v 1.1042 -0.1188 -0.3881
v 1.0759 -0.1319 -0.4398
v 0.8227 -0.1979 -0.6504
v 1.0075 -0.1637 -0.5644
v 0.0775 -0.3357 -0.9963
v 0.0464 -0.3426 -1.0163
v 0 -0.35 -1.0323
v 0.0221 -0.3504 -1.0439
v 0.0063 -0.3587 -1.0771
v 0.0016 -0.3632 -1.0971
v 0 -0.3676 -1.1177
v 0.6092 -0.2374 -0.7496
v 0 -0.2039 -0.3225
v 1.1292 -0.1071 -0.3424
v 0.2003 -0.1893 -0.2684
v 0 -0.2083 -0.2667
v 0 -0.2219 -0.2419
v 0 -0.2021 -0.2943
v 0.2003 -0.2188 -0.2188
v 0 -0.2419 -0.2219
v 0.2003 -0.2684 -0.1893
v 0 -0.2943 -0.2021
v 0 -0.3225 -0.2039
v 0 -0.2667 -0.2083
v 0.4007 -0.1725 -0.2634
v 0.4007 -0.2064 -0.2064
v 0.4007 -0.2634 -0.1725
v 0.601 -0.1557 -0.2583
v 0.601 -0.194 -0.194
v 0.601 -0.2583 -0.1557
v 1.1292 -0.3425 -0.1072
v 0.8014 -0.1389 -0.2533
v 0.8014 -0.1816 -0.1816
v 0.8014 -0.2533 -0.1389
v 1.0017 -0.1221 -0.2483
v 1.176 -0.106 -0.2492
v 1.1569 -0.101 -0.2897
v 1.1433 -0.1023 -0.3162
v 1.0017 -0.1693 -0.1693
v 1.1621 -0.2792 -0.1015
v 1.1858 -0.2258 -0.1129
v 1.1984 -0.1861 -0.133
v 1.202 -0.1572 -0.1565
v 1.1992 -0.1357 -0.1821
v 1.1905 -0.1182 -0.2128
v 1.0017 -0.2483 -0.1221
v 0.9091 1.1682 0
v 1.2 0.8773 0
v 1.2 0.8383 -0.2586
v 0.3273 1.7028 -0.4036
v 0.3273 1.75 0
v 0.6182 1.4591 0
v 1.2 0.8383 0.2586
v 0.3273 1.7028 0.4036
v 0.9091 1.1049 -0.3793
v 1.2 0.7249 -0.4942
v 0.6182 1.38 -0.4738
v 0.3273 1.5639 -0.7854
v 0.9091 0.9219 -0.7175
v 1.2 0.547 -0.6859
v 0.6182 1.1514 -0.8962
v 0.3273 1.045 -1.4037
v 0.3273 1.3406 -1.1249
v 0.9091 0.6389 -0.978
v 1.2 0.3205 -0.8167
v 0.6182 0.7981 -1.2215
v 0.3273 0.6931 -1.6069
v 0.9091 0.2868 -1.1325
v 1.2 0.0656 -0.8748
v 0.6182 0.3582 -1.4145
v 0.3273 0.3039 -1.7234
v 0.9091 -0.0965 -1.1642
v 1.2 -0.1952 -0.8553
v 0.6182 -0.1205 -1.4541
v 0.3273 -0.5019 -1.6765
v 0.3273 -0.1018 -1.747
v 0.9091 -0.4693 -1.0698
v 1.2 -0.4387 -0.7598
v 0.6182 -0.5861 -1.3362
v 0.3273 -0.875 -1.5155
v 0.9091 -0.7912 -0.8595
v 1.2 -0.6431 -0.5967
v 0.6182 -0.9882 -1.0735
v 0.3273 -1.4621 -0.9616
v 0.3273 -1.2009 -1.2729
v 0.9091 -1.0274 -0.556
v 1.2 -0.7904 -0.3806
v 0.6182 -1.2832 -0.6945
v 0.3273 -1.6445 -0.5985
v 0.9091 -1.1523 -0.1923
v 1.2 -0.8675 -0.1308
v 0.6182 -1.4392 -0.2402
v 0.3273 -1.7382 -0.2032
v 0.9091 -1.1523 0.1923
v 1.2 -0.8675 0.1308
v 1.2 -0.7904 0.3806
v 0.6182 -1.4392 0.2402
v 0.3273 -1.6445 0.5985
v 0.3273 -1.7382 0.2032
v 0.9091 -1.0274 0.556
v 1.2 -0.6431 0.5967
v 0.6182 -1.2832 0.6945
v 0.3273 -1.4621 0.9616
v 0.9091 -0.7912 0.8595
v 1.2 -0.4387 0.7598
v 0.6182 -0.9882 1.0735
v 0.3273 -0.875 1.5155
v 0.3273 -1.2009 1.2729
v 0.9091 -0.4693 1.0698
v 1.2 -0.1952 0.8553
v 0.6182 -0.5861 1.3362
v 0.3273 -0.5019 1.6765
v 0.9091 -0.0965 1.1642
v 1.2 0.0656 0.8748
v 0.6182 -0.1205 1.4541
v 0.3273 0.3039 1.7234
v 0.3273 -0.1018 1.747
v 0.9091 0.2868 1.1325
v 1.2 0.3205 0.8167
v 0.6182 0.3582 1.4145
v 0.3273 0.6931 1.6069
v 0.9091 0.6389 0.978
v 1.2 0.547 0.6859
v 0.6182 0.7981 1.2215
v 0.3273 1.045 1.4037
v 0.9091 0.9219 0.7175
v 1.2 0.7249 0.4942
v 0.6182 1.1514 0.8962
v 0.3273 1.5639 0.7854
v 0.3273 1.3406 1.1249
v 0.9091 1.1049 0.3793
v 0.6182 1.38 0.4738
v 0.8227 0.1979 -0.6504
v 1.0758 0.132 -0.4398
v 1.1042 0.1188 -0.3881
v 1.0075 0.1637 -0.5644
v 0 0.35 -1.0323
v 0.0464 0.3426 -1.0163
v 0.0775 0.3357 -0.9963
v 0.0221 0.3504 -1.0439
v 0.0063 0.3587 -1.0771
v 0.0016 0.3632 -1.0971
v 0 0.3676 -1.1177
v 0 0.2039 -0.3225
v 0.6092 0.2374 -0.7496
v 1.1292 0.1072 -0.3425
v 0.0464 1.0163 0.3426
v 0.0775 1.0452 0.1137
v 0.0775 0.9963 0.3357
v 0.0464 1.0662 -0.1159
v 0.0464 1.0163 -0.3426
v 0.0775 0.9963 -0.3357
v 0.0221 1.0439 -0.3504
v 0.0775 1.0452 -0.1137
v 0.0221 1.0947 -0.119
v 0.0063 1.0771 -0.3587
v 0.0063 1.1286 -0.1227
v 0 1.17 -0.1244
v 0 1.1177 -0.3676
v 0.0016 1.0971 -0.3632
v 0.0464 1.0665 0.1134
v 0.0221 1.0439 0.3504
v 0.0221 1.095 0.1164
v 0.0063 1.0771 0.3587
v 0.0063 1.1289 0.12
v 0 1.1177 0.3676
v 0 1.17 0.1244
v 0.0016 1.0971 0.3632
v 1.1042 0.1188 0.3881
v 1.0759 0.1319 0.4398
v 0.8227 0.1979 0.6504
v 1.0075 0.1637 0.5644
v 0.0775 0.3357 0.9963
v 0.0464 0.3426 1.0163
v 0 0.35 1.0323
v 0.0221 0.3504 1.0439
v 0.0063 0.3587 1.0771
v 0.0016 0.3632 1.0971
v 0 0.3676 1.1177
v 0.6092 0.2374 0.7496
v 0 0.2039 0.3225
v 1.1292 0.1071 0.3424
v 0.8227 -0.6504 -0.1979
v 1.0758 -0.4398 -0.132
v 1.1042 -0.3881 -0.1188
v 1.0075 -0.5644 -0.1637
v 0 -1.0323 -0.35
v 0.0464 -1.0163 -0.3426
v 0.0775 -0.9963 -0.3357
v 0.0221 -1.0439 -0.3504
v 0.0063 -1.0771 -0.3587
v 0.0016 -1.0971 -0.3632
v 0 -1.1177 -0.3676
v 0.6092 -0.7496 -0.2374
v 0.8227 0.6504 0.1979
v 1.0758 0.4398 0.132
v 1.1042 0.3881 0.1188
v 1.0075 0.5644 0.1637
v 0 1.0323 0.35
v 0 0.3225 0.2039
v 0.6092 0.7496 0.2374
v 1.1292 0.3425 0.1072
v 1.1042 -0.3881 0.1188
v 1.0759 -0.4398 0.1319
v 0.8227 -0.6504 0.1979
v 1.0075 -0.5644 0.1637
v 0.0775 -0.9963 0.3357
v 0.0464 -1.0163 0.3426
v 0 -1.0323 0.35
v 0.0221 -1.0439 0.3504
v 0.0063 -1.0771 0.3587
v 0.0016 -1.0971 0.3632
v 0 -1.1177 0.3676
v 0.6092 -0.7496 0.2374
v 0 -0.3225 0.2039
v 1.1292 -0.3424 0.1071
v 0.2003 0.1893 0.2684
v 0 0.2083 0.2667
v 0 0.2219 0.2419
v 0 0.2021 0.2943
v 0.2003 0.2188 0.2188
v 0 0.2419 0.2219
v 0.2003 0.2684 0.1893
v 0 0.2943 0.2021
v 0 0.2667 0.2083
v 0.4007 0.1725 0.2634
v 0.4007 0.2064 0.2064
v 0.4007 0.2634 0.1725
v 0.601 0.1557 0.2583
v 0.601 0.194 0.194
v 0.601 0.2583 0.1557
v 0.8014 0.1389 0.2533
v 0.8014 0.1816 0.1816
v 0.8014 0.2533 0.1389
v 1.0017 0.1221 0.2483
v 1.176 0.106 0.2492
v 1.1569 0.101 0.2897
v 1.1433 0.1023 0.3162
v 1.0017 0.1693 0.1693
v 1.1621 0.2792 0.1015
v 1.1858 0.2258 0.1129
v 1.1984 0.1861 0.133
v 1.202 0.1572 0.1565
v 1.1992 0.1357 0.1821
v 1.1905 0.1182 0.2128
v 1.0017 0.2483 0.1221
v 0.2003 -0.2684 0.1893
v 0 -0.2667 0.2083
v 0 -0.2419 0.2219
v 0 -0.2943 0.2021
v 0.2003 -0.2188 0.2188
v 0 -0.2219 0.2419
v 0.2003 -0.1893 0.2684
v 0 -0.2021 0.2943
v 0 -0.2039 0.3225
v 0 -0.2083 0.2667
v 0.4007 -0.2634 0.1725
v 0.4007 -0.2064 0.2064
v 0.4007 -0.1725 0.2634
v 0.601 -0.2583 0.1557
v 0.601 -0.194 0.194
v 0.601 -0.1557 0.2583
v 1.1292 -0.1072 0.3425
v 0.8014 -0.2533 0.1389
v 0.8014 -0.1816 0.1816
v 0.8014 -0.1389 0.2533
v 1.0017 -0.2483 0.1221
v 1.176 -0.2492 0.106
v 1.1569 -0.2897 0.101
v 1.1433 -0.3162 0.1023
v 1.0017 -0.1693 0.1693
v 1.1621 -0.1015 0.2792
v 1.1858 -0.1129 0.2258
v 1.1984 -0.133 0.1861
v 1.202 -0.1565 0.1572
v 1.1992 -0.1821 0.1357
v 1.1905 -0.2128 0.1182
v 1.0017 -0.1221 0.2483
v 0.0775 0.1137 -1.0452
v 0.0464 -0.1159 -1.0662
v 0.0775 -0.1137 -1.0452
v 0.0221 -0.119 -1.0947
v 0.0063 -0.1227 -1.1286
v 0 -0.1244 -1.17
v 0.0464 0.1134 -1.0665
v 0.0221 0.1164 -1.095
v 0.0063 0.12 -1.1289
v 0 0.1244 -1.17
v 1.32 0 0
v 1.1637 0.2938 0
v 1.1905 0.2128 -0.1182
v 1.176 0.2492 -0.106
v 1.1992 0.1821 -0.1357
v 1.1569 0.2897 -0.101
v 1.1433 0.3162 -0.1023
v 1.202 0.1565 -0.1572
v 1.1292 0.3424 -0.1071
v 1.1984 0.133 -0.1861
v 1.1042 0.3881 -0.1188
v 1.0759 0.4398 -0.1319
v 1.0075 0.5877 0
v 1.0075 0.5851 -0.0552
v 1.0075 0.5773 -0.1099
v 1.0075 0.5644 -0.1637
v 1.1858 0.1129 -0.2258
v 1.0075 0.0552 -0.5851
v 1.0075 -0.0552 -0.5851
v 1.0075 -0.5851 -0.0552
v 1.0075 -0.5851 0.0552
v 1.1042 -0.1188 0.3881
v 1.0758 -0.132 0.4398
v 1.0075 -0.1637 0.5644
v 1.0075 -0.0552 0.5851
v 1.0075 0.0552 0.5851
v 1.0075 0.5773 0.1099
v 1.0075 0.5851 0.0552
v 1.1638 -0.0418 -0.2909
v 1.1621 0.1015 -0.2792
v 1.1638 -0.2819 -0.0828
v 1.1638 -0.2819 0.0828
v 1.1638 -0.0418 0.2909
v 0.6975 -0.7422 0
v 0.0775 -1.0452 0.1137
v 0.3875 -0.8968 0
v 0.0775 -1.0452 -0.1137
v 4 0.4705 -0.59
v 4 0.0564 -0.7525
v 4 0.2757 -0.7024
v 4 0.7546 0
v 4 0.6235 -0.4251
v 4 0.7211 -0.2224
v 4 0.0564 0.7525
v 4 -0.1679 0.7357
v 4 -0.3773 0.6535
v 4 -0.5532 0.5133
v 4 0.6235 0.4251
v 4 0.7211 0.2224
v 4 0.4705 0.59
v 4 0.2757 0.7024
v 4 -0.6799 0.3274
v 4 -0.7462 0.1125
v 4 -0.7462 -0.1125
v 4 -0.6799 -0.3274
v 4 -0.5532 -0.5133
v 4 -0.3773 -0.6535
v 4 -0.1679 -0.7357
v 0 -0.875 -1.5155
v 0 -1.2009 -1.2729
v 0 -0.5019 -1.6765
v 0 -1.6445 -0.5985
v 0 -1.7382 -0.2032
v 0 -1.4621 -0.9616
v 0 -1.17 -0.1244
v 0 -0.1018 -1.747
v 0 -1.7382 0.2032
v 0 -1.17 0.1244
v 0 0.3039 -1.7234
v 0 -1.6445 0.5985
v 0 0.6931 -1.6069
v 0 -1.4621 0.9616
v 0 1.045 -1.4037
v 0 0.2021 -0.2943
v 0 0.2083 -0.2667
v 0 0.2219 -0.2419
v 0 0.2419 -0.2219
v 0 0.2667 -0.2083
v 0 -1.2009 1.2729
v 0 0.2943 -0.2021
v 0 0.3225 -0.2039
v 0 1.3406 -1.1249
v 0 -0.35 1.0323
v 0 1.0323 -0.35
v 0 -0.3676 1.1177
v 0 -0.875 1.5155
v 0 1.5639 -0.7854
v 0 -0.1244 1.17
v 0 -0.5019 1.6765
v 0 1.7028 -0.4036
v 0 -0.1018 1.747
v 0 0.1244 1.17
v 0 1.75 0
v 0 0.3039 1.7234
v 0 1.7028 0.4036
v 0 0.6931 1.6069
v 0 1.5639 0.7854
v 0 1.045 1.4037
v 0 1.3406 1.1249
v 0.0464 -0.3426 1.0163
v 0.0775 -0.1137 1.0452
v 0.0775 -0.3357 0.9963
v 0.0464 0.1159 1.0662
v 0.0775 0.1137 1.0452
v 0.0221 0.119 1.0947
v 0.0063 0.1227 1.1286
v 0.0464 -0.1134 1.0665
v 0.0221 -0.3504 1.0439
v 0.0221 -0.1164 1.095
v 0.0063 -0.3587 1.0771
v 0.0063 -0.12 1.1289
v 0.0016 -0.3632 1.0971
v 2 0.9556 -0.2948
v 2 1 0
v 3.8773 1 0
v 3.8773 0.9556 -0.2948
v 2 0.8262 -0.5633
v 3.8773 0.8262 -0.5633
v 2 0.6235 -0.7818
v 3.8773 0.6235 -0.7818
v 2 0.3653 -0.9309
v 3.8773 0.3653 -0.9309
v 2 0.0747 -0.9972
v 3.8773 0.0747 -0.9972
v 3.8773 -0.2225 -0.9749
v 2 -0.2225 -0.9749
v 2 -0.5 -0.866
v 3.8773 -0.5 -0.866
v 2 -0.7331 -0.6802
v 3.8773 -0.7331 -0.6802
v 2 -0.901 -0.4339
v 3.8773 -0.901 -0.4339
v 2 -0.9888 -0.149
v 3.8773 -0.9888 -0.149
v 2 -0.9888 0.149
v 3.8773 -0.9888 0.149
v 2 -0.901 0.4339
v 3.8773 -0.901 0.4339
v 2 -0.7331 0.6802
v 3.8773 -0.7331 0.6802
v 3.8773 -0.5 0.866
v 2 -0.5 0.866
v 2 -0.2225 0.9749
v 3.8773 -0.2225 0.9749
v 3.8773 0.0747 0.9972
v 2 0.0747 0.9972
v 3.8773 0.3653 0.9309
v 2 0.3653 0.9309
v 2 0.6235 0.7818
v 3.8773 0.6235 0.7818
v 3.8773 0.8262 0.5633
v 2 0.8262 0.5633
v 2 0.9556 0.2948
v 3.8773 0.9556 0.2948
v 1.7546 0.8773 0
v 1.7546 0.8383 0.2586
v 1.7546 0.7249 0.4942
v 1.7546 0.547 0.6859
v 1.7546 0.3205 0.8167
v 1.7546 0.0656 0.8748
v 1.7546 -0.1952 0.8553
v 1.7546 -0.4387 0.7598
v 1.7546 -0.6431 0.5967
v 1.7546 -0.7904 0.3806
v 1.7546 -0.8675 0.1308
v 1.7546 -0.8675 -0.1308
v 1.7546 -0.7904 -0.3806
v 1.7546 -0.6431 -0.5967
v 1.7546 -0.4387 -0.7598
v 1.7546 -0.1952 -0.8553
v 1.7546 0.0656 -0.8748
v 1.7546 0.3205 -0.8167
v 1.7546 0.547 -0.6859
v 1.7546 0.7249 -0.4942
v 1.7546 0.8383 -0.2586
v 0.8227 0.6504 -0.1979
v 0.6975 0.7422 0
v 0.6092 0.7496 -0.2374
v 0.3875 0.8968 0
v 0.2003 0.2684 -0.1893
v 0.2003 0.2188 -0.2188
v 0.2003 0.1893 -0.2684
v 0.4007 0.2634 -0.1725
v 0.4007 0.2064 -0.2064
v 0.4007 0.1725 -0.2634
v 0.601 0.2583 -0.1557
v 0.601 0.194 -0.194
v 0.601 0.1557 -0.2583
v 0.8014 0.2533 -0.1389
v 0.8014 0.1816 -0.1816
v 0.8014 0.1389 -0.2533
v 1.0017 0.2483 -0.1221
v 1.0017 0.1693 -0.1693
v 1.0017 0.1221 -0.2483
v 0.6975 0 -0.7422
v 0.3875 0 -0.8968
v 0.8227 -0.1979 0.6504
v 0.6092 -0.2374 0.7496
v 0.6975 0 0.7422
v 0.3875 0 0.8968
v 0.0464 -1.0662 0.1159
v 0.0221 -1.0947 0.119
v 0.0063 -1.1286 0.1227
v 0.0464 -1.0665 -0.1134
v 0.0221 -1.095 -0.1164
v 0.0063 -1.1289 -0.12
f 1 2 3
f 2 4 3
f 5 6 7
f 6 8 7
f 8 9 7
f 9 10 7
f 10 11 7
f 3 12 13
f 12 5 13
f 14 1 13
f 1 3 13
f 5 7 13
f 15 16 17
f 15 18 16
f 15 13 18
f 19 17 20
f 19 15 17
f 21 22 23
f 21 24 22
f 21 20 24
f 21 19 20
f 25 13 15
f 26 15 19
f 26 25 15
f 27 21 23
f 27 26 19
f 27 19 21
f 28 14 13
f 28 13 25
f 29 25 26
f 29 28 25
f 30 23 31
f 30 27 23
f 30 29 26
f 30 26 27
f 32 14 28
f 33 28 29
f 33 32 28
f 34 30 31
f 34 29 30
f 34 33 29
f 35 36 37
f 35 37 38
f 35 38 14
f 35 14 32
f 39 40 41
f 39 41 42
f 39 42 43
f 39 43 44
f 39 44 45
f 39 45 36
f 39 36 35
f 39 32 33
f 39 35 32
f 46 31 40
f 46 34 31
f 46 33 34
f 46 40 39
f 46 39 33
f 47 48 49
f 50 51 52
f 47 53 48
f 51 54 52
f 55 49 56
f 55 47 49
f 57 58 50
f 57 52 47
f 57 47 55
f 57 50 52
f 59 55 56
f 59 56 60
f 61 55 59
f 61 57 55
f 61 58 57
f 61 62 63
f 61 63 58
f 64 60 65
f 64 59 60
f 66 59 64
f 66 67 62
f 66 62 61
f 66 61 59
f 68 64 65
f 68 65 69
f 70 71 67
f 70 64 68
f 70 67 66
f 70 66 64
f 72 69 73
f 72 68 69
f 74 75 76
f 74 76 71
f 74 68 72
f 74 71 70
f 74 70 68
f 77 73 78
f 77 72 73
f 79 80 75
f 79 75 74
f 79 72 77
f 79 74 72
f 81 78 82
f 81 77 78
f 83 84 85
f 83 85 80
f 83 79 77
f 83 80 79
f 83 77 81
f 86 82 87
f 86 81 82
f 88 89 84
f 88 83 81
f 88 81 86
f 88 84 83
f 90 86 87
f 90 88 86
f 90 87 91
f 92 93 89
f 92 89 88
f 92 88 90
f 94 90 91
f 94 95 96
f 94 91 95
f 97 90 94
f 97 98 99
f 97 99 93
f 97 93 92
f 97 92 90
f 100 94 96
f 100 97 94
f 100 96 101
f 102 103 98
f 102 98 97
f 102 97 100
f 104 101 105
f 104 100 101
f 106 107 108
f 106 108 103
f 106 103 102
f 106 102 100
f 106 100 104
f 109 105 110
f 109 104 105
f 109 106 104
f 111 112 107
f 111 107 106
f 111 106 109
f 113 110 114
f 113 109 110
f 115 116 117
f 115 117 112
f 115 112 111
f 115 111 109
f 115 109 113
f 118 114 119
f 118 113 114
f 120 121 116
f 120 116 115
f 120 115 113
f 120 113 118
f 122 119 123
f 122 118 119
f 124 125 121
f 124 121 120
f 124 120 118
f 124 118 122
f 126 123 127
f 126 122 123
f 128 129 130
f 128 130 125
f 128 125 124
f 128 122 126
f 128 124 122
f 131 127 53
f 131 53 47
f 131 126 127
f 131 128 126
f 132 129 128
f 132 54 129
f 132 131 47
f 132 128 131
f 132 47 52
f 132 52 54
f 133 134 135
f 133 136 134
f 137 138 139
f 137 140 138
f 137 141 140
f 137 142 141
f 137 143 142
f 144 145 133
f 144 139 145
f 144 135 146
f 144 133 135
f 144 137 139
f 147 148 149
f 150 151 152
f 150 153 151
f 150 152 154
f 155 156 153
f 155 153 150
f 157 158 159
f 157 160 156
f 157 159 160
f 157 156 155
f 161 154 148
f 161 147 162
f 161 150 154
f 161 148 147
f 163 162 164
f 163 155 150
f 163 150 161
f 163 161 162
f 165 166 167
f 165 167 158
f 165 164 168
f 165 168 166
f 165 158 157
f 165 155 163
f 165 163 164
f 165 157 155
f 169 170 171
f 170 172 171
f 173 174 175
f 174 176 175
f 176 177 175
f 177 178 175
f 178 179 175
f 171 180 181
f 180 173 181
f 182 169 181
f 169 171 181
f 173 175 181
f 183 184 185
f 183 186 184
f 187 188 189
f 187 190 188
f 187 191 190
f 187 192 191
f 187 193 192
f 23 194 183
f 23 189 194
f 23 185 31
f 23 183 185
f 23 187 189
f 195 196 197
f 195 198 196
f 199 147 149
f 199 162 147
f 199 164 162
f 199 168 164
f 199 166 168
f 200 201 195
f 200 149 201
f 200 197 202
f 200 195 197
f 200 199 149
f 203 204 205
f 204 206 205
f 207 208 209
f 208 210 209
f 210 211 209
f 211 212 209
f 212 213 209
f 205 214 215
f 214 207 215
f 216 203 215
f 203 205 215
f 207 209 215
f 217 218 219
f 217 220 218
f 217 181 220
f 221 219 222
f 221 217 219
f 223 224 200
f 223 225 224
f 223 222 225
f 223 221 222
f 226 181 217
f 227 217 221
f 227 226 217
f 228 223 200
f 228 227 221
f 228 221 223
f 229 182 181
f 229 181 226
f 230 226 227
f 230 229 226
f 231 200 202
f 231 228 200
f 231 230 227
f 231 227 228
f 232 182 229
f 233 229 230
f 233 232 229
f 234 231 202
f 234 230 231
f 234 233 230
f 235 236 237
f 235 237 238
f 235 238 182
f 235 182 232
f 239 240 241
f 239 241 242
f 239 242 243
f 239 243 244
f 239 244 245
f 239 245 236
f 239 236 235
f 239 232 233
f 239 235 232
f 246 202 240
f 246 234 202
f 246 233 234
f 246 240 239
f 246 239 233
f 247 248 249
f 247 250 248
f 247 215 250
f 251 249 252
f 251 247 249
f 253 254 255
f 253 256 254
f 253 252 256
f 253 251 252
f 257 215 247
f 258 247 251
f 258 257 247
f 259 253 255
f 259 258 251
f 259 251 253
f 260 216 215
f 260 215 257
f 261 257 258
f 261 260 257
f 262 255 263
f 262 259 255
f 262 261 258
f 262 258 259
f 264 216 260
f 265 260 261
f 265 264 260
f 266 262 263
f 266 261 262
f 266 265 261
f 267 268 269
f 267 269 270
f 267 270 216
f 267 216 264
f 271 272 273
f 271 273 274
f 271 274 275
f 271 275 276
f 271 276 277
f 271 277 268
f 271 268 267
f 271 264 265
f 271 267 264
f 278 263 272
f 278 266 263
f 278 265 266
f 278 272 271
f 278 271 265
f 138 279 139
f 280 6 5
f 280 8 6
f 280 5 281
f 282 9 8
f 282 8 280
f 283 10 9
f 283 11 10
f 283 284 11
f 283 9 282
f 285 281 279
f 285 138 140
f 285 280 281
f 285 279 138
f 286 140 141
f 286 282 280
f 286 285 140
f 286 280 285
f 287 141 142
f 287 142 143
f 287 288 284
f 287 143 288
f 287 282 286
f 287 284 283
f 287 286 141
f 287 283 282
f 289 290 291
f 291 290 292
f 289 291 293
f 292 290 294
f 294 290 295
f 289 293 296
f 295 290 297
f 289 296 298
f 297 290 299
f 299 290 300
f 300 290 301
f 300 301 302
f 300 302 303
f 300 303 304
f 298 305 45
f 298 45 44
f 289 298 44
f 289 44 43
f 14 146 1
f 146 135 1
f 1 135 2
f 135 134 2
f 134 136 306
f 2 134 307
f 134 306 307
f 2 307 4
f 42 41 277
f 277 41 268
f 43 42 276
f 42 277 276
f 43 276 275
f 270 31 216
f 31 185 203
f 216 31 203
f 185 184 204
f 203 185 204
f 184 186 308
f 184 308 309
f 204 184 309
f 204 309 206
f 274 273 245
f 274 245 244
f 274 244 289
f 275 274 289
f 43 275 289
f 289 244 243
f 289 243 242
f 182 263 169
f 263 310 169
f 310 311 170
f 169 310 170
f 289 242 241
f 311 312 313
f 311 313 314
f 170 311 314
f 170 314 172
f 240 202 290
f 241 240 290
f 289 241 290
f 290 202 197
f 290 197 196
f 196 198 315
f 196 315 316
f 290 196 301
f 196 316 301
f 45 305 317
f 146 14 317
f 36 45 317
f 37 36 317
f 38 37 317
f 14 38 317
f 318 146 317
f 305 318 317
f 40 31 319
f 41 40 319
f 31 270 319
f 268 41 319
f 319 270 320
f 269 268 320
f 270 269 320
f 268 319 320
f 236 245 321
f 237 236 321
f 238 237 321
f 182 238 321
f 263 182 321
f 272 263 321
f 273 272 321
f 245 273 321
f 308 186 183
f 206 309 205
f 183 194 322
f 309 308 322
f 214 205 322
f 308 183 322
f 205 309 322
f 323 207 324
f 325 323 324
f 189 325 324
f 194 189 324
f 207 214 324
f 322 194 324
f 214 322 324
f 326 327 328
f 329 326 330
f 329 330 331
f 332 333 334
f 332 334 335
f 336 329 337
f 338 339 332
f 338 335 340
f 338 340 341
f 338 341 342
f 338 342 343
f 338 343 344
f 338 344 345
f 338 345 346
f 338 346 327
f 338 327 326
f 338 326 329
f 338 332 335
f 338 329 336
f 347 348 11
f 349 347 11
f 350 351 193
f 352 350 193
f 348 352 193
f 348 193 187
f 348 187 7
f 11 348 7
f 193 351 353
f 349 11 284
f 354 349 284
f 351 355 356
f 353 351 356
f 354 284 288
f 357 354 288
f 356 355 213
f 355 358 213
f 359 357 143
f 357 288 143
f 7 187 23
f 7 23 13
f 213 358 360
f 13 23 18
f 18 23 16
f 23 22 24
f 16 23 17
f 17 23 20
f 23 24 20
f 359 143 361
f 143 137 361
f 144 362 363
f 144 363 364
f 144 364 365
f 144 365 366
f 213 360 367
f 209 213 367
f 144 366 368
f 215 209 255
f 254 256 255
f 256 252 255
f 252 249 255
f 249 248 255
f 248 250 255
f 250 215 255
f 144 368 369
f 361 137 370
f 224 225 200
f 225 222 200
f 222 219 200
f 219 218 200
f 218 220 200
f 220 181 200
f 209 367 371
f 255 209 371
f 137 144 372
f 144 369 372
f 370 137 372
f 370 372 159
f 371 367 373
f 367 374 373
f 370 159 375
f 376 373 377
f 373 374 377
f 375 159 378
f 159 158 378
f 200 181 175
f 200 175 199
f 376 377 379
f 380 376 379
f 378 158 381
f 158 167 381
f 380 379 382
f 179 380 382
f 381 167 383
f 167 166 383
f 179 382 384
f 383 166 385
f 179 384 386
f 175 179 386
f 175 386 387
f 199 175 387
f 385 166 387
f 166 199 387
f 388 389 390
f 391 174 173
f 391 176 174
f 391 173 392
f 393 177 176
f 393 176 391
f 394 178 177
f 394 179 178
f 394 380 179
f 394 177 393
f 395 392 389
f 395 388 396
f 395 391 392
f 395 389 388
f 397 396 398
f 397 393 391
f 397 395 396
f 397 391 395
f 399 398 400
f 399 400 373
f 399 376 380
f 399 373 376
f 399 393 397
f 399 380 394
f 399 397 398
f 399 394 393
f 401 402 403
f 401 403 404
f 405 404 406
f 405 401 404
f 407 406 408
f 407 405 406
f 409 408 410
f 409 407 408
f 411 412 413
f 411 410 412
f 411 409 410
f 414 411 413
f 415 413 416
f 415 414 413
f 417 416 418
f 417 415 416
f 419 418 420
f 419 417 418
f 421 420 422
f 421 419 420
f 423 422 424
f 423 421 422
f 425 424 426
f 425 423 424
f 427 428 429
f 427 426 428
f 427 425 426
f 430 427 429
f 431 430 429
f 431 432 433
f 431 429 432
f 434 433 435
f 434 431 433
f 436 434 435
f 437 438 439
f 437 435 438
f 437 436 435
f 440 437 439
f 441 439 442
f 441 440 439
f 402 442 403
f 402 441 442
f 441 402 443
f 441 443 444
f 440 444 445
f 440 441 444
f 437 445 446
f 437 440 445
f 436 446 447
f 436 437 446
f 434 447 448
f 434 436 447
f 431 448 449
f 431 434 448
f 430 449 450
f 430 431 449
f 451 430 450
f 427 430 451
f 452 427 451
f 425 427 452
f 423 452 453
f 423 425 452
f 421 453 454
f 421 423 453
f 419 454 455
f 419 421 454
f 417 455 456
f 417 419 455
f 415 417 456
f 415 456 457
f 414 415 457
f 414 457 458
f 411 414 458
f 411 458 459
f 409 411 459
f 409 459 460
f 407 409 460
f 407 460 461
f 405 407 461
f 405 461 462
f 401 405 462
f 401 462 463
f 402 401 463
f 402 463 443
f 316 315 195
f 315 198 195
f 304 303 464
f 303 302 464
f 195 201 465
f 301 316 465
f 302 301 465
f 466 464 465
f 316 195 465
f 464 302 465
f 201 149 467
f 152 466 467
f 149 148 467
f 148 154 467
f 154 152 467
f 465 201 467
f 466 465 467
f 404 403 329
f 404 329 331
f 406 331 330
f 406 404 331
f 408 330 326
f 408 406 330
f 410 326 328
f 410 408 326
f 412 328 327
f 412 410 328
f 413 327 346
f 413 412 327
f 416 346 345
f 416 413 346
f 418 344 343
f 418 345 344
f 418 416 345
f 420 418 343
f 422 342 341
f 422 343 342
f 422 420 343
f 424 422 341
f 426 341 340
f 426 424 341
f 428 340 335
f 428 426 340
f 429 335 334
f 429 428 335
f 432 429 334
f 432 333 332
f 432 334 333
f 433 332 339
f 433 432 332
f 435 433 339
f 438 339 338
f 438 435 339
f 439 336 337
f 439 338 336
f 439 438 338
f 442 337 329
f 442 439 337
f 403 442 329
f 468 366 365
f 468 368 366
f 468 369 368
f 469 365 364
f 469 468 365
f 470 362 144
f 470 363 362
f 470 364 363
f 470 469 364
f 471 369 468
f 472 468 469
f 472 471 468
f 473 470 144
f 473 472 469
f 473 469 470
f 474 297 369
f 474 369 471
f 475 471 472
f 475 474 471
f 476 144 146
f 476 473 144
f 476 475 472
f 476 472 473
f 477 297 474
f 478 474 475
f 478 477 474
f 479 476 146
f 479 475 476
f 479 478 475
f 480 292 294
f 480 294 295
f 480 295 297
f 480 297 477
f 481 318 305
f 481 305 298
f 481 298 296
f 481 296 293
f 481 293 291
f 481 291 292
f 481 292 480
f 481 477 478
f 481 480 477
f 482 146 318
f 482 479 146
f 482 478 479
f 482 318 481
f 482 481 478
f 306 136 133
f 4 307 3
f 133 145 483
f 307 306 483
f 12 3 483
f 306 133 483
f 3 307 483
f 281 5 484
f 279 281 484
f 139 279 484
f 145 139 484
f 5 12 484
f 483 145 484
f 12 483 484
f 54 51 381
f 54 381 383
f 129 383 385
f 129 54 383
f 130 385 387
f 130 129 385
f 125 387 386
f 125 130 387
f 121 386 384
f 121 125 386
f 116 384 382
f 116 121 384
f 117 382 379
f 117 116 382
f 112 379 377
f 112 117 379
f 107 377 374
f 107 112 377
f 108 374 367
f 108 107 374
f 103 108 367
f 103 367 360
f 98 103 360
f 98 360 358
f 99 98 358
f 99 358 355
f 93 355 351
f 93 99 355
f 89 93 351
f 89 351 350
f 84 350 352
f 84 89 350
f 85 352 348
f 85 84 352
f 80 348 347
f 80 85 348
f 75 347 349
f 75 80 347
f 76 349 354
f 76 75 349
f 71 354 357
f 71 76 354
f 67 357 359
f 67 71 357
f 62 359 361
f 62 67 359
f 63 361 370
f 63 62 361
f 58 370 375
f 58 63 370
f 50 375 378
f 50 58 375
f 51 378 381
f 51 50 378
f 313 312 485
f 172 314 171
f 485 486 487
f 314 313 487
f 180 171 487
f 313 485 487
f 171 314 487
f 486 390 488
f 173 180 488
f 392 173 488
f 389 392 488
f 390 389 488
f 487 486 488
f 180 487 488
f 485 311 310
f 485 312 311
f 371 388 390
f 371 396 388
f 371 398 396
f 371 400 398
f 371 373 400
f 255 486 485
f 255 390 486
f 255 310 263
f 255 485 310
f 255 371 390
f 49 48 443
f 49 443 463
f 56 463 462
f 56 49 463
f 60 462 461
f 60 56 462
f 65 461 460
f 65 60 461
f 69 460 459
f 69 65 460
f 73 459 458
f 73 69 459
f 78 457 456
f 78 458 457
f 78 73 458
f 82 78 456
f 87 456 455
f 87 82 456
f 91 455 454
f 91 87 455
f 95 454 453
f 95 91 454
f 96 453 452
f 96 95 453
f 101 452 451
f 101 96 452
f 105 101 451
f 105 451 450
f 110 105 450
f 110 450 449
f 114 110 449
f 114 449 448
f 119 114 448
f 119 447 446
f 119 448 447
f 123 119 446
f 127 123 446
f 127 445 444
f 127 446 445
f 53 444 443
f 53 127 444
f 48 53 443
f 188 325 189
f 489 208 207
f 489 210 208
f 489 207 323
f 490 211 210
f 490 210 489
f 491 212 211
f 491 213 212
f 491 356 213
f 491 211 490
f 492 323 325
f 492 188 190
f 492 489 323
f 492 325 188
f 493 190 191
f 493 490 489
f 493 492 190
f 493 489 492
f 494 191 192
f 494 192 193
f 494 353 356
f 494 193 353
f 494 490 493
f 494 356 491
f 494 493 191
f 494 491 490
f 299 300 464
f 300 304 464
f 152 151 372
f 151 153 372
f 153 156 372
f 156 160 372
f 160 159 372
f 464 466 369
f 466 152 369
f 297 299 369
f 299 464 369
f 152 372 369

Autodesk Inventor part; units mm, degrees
ref_plane "YZ Plane" through (0, 0, 0) normal (1, 0, 0) x (0, 1, 0)
ref_plane "XZ Plane" through (0, 0, 0) normal (0, 1, 0) x (-1, 0, 0)
sketch "Sketch1" plane through (0, 0, 0) normal (0, 0, 1) x (1, 0, 0)
  line L0 (1.32, 0) -> (4, 0)
  line L1 (4, 0) -> (4, 1)
  line L2 (4, 1) -> (2, 1)
  line L3 (2, 1) -> (1.7546, 0.8773)
  line L4 (1.7546, 0.8773) -> (1.2, 0.8773)
  line L5 (0, 1.75) -> (0, 1.09)
  line L6 (0, 1.09) -> (1.0075, 0.5877)
  line L7 (1.0075, 0.5877) -> (1.32, 0)
  line L8 (-0.8, 0) -> (4.8, 0) projected
  line L9 (0, -0.35) -> (0, 2.1) projected
  line L10 (0, 1.75) -> (0.3273, 1.75)
  line L11 (0.3273, 1.75) -> (1.2, 0.8773)
  line L12 (2, 1) -> (1.0773, 1) construction
  dimension "d1" = 2
  dimension "d2" = 2
  dimension "d3" = 1.7546
  dimension "d4" = 2.18
  dimension "d5" = 26.5
  dimension "d6" = 62
  dimension "d7" = 1.32
  dimension "d8" = 0.2454
  dimension "d12" = 3.5
  dimension "d13" = 45
  dimension "d15" = 4
  dimension "d24" = 1.2
revolve "Body" add sketch "Sketch1" angle 360 about axis through (1.32, 0, 0) along (1, 0, 0) contours L7 L6 L5 L10 L11 L4 L3 L2 L1 L0
sketch "Sketch2" plane through (0, 0, 0) normal (-1, 0, 0) x (0, 0, 1)
  line L0 (0, 1.09) -> (0, 0) construction
  line L1 (0, 0) -> (1.09, 0) construction
  arc A0 (0.327, 0) -> (0, 0.327) centre (0, 0) ccw construction
  arc A1 (0.3815, 0) -> (0, 0.3815) centre (0, 0) ccw construction
  arc A2 (1.0323, 0.35) -> (0.35, 1.0323) centre (0, 0) ccw
  line L2 (0, 0) -> (0.7707, 0.7707) construction
  line L3 (0.35, 1.0323) -> (0.2039, 0.3225)
  line L4 (1.0323, 0.35) -> (0.3225, 0.2039)
  arc A3 (0.35, 1.0323) -> (0, 1.09) centre (0, 0) ccw
  arc A4 (1.09, 0) -> (1.0323, 0.35) centre (0, 0) ccw
  line L5 (0, -2.45) -> (0, 2.45) projected
  line L6 (-2.45, 0) -> (2.45, 0) projected
  arc A5 (0.35, -1.0323) -> (1.0323, -0.35) centre (0, 0) ccw
  line L7 (0.35, -1.0323) -> (0.2039, -0.3225)
  line L8 (1.0323, -0.35) -> (0.3225, -0.2039)
  arc A6 (0, -1.09) -> (0.35, -1.0323) centre (0, 0) ccw
  arc A7 (1.0323, -0.35) -> (1.09, 0) centre (0, 0) ccw
  arc A8 (-0.35, 1.0323) -> (-1.0323, 0.35) centre (0, 0) ccw
  line L9 (-0.35, 1.0323) -> (-0.2039, 0.3225)
  line L10 (-1.0323, 0.35) -> (-0.3225, 0.2039)
  arc A9 (0, 1.09) -> (-0.35, 1.0323) centre (0, 0) ccw
  arc A10 (-1.0323, 0.35) -> (-1.09, 0) centre (0, 0) ccw
  arc A11 (-0.35, -1.0323) -> (0, -1.09) centre (0, 0) ccw
  arc A12 (-1.0323, -0.35) -> (-0.35, -1.0323) centre (0, 0) ccw
  arc A13 (-1.09, 0) -> (-1.0323, -0.35) centre (0, 0) ccw
  line L11 (-1.0323, -0.35) -> (-0.3225, -0.2039)
  line L12 (-0.35, -1.0323) -> (-0.2039, -0.3225)
  arc A14 (0.2039, 0.3225) -> (0.3225, 0.2039) centre (0.3022, 0.3022) ccw
  arc A15 (0.3225, -0.2039) -> (0.2039, -0.3225) centre (0.3022, -0.3022) ccw
  arc A16 (-0.3225, 0.2039) -> (-0.2039, 0.3225) centre (-0.3022, 0.3022) ccw
  arc A17 (-0.2039, -0.3225) -> (-0.3225, -0.2039) centre (-0.3022, -0.3022) ccw
  point P0 (0.7707, -0.7707)
  point P1 (-0.7707, 0.7707)
  point P2 (-0.7707, -0.7707)
  dimension "d17" = 0.654
  dimension "d18" = 0.763
  dimension "d19" = 2.18
  dimension "d20" = 45
  dimension "d21" = 0.35
extrude "Slot" add sketch "Sketch2" against normal up to next draft 5 contours L4 A14 L3 A2 | A5 L7 A15 L8 | L9 A16 L10 A8 | A12 L11 A17 L12
fillet "Fillet1" radius 0.14 4 edges at (0, 1.09, 0) (0, 0, -1.09) (0, -1.09, 0) (0, 0, 1.09)
thread "Thread" size "M2x0.4" class "6g" standard "ISO Metric profile" length 2
chamfer "Chamfer1" distance 0.2454 distance2 0.1227 1 edges at (4, -1, 0) measured on face at (4, 0.479, -0.3842)
ref_plane "Work Plane2" through (3.35, 0, 0) normal (0, 0, -1) x (1, 0, 0)
equation "\"d1\" = GEL"
equation "\"d2\" = GD"
equation "\"d3\" = BDM"
equation "\"d4\" = SDM"
equation "\"d7\" = INTI"
equation "\"d8\" = GAL"
equation "\"d12\" = KOD"
equation "\"d13\" = 0.5 * SEWI"
equation "\"d15\" = NLG"
equation "\"d24\" = KOH"
equation "\"d17\" = 0.3 * SDM"
equation "\"d18\" = 0.35 * SDM"
equation "\"d19\" = SDM"
equation "\"d21\" = 0.5 * SBR"
equation "\"d23\" = 0.2 * SBR"
equation "\"d10\" = GEL"
equation "\"d25\" = -0.5 * SPD + 0.5 * GD"
equation "\"d26\" = 0.5 * GAL"
equation "\"NLG\" = 4"
equation "\"GEL\" = 2"
equation "\"GAL\" = 0.61345 * PTC"
equation "\"SPD\" = NND - 1.2269 * PTC"
equation "\"KOD\" = 3.5"
equation "\"KOH\" = 1.2"
equation "\"SBR\" = 0.7"
equation "\"INTI\" = 1.32"
equation "\"SDM\" = 2.18"
equation "\"GD\" = NND"
equation "\"BDM\" = NND - GAL"
equation "\"SEWI\" = 90deg"
equation "\"d9\" = SDM"
equation "\"GUL\" = 0.61345 * PTC"
equation "\"TOA\" = 30deg"
equation "\"EPV\" = 2.2"
equation "\"THREADDIA\" = 2"
equation "\"RR\" = 0.2"
equation "\"PTC\" = 0.4"
equation "\"NND\" = 2"
equation "\"GD1\" = THREADDIA - 1.2269 * PTC"
properties part number "AS 1427 - M2 x 4(5)" material "Steel, Mild"
